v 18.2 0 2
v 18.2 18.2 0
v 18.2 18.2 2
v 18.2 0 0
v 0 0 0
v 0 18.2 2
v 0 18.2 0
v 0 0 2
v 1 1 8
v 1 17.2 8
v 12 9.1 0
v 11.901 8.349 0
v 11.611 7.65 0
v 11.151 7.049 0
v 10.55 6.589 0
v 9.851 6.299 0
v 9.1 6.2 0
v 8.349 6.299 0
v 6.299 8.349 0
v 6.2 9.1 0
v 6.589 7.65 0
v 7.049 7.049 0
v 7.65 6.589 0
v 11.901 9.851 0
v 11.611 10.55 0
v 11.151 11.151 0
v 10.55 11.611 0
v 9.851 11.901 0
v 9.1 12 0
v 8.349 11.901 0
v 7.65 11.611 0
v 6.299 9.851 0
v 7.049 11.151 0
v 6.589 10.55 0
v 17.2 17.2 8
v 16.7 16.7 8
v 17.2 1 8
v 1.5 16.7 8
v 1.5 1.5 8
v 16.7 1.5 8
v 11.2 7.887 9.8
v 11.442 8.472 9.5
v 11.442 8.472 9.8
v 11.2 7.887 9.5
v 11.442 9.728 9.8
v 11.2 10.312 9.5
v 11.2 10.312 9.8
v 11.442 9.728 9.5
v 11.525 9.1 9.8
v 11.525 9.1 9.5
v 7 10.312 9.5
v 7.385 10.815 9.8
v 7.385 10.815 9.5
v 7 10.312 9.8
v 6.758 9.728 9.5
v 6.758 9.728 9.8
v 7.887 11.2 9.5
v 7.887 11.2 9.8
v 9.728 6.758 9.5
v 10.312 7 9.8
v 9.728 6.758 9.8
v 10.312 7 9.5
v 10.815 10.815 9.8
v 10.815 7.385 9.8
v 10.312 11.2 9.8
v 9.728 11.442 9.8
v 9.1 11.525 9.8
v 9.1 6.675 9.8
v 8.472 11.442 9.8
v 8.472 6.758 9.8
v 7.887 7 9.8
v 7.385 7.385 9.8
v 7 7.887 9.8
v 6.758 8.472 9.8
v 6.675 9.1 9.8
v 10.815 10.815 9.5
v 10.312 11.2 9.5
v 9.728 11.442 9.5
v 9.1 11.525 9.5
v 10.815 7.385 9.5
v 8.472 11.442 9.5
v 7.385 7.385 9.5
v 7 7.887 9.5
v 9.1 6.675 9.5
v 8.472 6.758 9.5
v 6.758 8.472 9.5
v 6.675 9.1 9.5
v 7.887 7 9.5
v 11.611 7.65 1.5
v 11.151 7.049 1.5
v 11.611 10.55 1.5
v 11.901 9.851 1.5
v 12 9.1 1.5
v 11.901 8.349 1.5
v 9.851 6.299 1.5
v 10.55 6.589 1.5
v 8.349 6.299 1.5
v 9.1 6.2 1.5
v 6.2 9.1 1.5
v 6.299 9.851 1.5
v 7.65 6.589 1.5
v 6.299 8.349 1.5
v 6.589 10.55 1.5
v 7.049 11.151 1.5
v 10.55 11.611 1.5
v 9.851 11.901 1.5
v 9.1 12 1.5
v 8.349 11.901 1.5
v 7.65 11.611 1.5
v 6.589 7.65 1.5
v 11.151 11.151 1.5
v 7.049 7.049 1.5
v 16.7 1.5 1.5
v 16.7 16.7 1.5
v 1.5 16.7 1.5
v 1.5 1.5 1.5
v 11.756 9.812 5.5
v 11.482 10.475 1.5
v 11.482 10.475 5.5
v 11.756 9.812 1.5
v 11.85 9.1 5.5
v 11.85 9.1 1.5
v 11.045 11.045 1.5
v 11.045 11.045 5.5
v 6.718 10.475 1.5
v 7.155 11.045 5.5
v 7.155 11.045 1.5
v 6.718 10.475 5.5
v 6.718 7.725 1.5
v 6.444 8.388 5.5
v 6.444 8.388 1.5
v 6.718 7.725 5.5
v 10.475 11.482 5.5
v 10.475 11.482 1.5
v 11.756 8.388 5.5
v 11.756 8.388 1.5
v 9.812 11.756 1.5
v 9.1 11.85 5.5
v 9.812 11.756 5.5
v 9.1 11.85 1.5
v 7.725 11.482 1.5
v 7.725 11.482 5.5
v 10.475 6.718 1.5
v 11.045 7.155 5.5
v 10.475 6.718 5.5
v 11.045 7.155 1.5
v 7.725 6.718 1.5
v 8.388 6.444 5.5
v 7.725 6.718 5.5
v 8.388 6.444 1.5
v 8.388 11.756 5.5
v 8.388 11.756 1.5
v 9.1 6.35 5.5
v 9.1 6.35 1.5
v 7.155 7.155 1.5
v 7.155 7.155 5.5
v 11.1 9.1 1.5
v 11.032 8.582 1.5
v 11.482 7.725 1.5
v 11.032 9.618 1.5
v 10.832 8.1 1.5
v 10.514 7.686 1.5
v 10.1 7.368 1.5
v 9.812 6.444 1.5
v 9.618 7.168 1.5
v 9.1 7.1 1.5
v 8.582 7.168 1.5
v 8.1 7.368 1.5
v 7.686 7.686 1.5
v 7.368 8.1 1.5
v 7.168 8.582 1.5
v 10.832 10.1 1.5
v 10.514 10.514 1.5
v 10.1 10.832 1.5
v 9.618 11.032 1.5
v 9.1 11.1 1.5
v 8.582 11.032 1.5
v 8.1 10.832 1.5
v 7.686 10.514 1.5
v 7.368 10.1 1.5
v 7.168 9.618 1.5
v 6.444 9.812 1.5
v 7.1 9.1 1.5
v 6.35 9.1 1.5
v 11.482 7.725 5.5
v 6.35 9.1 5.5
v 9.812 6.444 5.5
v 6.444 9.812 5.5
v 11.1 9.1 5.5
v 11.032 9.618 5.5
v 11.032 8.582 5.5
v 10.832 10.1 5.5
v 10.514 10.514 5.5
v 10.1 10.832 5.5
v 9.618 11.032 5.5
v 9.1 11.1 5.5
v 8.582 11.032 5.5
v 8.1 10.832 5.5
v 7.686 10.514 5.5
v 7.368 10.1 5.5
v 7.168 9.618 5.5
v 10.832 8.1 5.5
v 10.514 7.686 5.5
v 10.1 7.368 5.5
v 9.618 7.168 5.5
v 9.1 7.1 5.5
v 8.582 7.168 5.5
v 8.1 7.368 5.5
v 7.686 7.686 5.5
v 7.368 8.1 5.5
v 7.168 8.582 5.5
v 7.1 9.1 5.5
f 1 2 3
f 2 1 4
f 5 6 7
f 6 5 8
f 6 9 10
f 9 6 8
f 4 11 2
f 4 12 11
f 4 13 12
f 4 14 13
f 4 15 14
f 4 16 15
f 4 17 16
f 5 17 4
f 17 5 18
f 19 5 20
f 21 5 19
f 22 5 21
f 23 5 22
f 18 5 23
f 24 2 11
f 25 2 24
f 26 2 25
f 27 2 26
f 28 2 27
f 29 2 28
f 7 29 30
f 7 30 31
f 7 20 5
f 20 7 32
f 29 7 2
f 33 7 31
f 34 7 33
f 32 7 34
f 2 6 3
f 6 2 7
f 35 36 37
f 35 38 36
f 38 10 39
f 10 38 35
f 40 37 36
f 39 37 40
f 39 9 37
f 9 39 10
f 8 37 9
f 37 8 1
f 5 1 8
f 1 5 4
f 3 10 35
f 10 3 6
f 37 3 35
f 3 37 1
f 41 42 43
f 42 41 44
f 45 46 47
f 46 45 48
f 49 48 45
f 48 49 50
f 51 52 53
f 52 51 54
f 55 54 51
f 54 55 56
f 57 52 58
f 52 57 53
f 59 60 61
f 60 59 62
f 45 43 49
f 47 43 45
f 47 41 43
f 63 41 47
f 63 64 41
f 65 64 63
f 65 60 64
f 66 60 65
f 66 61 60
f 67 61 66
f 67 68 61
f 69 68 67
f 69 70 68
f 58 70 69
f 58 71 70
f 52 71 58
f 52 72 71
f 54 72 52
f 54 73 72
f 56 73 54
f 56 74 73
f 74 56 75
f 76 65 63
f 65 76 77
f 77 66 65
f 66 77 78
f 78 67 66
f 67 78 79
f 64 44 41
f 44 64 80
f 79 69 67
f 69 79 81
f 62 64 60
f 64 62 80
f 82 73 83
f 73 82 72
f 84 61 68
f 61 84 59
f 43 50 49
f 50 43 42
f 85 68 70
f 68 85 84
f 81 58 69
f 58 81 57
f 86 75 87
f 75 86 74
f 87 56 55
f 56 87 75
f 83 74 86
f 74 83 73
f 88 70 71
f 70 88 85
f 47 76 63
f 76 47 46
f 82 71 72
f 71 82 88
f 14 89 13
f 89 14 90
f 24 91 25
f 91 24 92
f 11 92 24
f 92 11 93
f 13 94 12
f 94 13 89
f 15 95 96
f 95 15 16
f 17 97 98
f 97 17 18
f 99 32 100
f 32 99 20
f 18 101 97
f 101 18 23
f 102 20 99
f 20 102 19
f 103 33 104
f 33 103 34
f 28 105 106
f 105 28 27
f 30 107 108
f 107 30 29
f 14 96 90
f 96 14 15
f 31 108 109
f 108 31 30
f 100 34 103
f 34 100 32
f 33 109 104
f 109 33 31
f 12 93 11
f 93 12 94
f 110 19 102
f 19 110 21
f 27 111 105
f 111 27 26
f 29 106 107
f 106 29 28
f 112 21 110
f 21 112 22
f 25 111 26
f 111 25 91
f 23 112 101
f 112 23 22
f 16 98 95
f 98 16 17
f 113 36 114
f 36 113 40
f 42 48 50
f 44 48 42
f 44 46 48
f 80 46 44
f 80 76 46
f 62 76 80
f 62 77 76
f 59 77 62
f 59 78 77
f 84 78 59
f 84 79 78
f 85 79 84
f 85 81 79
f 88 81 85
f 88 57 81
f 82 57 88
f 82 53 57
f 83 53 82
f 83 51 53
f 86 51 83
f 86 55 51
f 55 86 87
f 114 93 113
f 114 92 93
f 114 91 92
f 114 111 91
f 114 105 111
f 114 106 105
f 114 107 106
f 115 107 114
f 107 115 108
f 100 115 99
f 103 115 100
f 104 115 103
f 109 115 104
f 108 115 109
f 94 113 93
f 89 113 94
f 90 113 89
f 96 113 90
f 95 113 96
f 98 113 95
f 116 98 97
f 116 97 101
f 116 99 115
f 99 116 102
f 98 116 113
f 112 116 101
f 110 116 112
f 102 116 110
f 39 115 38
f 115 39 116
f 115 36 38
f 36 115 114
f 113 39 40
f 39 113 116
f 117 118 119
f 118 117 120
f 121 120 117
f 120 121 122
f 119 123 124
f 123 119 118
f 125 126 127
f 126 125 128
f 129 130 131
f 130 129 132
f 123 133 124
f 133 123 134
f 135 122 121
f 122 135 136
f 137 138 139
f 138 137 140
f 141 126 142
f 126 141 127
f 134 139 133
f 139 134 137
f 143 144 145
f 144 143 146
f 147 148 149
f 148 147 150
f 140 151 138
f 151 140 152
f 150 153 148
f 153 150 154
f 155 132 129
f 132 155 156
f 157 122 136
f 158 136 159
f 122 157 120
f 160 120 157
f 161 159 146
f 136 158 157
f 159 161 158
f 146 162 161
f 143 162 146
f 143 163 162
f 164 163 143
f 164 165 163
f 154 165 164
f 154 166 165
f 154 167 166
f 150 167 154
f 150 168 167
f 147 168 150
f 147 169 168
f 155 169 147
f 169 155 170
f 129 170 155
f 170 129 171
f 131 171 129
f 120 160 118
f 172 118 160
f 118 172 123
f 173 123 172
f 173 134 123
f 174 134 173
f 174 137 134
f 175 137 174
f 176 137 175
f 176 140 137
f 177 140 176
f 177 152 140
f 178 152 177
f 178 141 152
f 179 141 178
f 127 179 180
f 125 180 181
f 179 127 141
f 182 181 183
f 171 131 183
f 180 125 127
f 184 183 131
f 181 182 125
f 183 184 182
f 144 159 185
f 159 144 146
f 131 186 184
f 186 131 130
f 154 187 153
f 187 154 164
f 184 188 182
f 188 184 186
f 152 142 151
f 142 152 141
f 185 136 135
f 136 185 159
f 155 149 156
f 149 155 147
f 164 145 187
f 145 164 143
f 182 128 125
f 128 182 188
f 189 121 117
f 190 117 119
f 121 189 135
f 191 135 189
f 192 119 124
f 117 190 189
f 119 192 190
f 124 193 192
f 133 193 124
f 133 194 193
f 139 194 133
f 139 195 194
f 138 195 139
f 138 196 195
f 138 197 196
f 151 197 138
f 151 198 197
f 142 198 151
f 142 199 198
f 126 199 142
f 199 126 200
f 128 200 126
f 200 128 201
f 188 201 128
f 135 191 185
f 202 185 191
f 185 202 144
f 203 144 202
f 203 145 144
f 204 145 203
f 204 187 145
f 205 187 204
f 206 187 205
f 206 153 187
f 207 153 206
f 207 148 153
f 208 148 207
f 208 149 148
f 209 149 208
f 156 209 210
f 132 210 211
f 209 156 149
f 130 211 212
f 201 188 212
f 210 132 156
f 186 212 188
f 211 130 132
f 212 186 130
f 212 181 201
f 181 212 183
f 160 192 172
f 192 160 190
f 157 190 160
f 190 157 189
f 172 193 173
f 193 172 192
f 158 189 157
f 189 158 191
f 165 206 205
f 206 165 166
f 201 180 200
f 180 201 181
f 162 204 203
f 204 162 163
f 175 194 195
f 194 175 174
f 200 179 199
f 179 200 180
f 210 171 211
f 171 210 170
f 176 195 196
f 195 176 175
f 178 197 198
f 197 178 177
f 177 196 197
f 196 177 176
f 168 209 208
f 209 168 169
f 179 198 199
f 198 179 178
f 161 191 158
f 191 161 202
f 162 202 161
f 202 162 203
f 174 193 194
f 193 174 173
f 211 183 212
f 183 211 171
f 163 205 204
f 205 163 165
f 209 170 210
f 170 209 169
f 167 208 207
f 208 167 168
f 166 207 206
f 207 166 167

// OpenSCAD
// LEGO Stud Keycap - MX Compatible
// Viral on social media, sells well as novelty
// Print: 0.15mm, 4 walls, 30% infill, no supports

MX_W       = 18.2;   // Cherry MX top size
MX_H       = 8.0;    // Keycap height
STEM_D_OD  = 5.5;    // MX stem outer
STEM_D_ID  = 4.0;    // MX stem inner (cross not modeled - use insert)
STEM_H     = 4.0;
WALL_T     = 1.5;
STUD_D     = 4.85;
STUD_H     = 1.8;

module mx_stem() {
    difference() {
        cylinder(d = STEM_D_OD, h = STEM_H, $fn = 24);
        cylinder(d = STEM_D_ID, h = STEM_H, $fn = 24);
    }
}

difference() {
    union() {
        // Keycap body
        hull() {
            cube([MX_W, MX_W, 2]);
            translate([1, 1, MX_H - 2])
                cube([MX_W - 2, MX_W - 2, 2]);
        }
        // LEGO stud on top
        translate([MX_W/2, MX_W/2, MX_H])
            cylinder(d = STUD_D, h = STUD_H, $fn = 24);
    }
    // MX stem socket (cylindrical — user can glue MX adapter or print cross separately)
    translate([MX_W/2, MX_W/2, -1])
        cylinder(d = STEM_D_OD + 0.3, h = STEM_H + 1, $fn = 24);
    // Hollow interior
    translate([WALL_T, WALL_T, WALL_T])
        cube([MX_W - 2*WALL_T, MX_W - 2*WALL_T, MX_H]);
}

// MX stem (print separately or together)
translate([MX_W/2, MX_W/2, WALL_T])
    mx_stem();
